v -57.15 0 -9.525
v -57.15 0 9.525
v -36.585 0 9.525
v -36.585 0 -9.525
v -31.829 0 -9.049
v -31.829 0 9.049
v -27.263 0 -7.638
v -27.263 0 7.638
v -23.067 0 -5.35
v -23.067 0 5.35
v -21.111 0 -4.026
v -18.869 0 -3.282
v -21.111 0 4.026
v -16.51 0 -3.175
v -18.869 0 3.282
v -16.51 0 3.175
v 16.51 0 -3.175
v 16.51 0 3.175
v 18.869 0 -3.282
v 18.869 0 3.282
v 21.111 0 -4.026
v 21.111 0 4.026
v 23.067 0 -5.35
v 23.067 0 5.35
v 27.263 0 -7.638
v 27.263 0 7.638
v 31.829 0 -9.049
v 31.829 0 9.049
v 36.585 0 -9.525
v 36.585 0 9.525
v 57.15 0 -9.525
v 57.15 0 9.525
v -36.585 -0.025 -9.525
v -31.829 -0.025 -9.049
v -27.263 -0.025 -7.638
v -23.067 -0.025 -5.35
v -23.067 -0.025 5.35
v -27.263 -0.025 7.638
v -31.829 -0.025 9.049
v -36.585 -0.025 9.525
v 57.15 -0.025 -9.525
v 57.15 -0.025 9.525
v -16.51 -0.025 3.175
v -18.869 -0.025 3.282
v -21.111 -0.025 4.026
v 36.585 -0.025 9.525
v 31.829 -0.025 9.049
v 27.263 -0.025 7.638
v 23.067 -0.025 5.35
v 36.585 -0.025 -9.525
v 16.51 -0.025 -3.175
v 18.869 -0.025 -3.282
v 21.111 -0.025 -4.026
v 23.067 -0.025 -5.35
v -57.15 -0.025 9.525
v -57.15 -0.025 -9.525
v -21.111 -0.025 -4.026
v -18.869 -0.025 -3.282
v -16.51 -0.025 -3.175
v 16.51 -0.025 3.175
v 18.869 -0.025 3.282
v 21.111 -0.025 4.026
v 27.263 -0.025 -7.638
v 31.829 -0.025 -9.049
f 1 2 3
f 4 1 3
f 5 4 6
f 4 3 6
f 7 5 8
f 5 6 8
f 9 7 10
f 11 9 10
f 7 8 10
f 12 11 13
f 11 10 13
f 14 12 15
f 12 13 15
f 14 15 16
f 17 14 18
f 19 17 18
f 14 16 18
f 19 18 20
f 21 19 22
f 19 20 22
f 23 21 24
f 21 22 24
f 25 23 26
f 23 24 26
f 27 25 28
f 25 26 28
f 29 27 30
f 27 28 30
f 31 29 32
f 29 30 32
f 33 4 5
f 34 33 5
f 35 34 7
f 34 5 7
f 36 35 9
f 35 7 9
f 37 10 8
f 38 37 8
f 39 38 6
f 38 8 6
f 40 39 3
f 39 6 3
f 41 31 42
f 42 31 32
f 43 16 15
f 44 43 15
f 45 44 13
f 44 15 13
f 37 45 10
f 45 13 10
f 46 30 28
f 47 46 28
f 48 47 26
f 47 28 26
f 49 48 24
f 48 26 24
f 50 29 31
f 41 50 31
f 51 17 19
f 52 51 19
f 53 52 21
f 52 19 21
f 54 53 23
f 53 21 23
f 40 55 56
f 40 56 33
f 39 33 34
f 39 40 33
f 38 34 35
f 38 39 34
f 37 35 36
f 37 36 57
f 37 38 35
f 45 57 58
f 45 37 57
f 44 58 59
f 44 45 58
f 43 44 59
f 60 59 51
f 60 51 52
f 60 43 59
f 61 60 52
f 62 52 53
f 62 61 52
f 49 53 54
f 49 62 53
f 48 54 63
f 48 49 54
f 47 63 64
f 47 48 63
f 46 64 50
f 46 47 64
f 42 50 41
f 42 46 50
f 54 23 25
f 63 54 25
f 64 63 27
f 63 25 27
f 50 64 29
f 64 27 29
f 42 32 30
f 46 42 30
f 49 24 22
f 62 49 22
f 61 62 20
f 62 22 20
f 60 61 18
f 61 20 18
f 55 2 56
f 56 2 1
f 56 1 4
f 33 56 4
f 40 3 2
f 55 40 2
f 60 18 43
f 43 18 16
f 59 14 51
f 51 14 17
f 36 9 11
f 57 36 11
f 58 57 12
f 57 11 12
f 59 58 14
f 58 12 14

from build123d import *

# Parameters (mm, degrees)
F1_DEPTH = 0.0254


with BuildPart() as f1:
    # F0 (on Front) → F1 (new body)
    with BuildSketch(Plane.XZ):
        with BuildLine():
            Line((-57.15, 9.525), (-57.15, 0))
            Line((-57.15, 0), (-57.15, -9.525))
            Line((-57.15, -9.525), (-36.584958, -9.525))
            ThreePointArc((-36.584958, -9.525), (-29.510865, -8.457538), (-23.066737, -5.35021))
            ThreePointArc((-23.066737, -5.35021), (-20.015893, -3.576776), (-16.51, -3.175))
            Line((-16.51, -3.175), (0, -3.175))
            Line((0, -3.175), (16.51, -3.175))
            ThreePointArc((16.51, -3.175), (20.015893, -3.576776), (23.066737, -5.35021))
            ThreePointArc((23.066737, -5.35021), (29.510865, -8.457538), (36.584958, -9.525))
            Line((36.584958, -9.525), (57.15, -9.525))
            Line((57.15, -9.525), (57.15, 0))
            Line((57.15, 0), (57.15, 9.525))
            Line((57.15, 9.525), (36.584958, 9.525))
            ThreePointArc((36.584958, 9.525), (29.510865, 8.457538), (23.066737, 5.35021))
            ThreePointArc((23.066737, 5.35021), (20.015893, 3.576776), (16.51, 3.175))
            Line((16.51, 3.175), (0, 3.175))
            Line((0, 3.175), (-16.51, 3.175))
            ThreePointArc((-16.51, 3.175), (-20.015893, 3.576776), (-23.066737, 5.35021))
            ThreePointArc((-23.066737, 5.35021), (-29.510865, 8.457538), (-36.584958, 9.525))
            Line((-36.584958, 9.525), (-57.15, 9.525))
        make_face()
    extrude(amount=F1_DEPTH)


solid = f1.part
